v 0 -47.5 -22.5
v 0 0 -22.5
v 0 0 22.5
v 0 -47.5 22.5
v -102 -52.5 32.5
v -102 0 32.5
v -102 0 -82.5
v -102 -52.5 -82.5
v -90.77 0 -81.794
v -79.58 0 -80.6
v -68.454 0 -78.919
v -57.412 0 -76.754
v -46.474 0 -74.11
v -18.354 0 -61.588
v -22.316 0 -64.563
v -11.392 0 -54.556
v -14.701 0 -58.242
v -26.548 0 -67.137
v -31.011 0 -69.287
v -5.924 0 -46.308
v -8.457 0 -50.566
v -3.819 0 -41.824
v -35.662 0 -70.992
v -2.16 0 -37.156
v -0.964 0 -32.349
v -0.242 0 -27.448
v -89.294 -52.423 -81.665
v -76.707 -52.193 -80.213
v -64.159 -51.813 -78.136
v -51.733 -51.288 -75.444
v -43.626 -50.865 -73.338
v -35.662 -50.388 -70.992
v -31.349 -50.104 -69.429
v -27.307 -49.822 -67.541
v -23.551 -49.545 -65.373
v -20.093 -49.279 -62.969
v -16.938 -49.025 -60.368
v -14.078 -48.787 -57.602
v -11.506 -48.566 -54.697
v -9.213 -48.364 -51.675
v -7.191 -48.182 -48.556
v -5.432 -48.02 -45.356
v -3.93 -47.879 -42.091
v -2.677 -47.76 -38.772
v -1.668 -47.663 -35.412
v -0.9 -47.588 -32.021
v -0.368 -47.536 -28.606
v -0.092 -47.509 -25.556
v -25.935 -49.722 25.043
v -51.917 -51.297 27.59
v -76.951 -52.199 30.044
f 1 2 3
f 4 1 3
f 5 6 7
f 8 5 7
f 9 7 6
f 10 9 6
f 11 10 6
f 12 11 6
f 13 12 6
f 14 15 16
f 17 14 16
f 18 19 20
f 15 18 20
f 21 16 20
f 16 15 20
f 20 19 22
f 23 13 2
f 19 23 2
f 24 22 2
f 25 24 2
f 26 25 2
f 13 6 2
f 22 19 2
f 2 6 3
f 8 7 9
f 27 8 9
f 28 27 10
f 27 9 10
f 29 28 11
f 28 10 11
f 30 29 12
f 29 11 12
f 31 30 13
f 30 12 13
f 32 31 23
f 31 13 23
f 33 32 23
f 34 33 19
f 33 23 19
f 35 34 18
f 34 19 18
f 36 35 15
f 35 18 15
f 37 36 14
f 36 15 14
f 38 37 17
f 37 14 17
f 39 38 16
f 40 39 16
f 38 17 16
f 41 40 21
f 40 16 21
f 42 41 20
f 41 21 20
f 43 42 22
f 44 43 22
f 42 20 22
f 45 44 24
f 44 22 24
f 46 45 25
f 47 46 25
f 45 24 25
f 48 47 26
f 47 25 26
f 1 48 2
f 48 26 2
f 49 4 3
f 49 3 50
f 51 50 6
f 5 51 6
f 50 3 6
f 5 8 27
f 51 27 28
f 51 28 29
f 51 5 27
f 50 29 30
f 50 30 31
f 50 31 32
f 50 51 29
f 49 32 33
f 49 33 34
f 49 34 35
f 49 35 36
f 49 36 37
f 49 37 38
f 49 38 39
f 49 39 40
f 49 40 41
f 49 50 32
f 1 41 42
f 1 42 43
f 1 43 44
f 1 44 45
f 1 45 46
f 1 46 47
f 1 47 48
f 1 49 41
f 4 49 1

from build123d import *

# Parameters (mm, degrees)
F5_DEPTH = 65
F6_DEPTH = 100


with BuildPart() as f5:
    # F0 (on Front) → F5 (new body)
    with BuildSketch(Plane.XZ):
        with BuildLine():
            Line((0, 22.5), (-102, 32.5))
            Line((-102, 32.5), (-102, -82.5))
            ThreePointArc((-102, -82.5), (-68.454124, -78.918769), (-35.66207, -70.992093))
            ThreePointArc((-35.66207, -70.992093), (-9.875393, -52.596787), (0, -22.5))
            Line((0, -22.5), (0, 22.5))
        make_face()
    extrude(amount=F5_DEPTH)

    # F4 (on Top) → F6 (intersect, symmetric)
    with BuildSketch(Plane.XY):
        with BuildLine():
            Line((0, 0), (-102, 0))
            Line((-102, 0), (-102, -52.5))
            ThreePointArc((-102, -52.5), (-50.938762, -51.24925), (0, -47.5))
            Line((0, -47.5), (0, -22.5))
            Line((0, -22.5), (0, 0))
        make_face()
    extrude(amount=F6_DEPTH, both=True, mode=Mode.INTERSECT)


solid = f5.part
